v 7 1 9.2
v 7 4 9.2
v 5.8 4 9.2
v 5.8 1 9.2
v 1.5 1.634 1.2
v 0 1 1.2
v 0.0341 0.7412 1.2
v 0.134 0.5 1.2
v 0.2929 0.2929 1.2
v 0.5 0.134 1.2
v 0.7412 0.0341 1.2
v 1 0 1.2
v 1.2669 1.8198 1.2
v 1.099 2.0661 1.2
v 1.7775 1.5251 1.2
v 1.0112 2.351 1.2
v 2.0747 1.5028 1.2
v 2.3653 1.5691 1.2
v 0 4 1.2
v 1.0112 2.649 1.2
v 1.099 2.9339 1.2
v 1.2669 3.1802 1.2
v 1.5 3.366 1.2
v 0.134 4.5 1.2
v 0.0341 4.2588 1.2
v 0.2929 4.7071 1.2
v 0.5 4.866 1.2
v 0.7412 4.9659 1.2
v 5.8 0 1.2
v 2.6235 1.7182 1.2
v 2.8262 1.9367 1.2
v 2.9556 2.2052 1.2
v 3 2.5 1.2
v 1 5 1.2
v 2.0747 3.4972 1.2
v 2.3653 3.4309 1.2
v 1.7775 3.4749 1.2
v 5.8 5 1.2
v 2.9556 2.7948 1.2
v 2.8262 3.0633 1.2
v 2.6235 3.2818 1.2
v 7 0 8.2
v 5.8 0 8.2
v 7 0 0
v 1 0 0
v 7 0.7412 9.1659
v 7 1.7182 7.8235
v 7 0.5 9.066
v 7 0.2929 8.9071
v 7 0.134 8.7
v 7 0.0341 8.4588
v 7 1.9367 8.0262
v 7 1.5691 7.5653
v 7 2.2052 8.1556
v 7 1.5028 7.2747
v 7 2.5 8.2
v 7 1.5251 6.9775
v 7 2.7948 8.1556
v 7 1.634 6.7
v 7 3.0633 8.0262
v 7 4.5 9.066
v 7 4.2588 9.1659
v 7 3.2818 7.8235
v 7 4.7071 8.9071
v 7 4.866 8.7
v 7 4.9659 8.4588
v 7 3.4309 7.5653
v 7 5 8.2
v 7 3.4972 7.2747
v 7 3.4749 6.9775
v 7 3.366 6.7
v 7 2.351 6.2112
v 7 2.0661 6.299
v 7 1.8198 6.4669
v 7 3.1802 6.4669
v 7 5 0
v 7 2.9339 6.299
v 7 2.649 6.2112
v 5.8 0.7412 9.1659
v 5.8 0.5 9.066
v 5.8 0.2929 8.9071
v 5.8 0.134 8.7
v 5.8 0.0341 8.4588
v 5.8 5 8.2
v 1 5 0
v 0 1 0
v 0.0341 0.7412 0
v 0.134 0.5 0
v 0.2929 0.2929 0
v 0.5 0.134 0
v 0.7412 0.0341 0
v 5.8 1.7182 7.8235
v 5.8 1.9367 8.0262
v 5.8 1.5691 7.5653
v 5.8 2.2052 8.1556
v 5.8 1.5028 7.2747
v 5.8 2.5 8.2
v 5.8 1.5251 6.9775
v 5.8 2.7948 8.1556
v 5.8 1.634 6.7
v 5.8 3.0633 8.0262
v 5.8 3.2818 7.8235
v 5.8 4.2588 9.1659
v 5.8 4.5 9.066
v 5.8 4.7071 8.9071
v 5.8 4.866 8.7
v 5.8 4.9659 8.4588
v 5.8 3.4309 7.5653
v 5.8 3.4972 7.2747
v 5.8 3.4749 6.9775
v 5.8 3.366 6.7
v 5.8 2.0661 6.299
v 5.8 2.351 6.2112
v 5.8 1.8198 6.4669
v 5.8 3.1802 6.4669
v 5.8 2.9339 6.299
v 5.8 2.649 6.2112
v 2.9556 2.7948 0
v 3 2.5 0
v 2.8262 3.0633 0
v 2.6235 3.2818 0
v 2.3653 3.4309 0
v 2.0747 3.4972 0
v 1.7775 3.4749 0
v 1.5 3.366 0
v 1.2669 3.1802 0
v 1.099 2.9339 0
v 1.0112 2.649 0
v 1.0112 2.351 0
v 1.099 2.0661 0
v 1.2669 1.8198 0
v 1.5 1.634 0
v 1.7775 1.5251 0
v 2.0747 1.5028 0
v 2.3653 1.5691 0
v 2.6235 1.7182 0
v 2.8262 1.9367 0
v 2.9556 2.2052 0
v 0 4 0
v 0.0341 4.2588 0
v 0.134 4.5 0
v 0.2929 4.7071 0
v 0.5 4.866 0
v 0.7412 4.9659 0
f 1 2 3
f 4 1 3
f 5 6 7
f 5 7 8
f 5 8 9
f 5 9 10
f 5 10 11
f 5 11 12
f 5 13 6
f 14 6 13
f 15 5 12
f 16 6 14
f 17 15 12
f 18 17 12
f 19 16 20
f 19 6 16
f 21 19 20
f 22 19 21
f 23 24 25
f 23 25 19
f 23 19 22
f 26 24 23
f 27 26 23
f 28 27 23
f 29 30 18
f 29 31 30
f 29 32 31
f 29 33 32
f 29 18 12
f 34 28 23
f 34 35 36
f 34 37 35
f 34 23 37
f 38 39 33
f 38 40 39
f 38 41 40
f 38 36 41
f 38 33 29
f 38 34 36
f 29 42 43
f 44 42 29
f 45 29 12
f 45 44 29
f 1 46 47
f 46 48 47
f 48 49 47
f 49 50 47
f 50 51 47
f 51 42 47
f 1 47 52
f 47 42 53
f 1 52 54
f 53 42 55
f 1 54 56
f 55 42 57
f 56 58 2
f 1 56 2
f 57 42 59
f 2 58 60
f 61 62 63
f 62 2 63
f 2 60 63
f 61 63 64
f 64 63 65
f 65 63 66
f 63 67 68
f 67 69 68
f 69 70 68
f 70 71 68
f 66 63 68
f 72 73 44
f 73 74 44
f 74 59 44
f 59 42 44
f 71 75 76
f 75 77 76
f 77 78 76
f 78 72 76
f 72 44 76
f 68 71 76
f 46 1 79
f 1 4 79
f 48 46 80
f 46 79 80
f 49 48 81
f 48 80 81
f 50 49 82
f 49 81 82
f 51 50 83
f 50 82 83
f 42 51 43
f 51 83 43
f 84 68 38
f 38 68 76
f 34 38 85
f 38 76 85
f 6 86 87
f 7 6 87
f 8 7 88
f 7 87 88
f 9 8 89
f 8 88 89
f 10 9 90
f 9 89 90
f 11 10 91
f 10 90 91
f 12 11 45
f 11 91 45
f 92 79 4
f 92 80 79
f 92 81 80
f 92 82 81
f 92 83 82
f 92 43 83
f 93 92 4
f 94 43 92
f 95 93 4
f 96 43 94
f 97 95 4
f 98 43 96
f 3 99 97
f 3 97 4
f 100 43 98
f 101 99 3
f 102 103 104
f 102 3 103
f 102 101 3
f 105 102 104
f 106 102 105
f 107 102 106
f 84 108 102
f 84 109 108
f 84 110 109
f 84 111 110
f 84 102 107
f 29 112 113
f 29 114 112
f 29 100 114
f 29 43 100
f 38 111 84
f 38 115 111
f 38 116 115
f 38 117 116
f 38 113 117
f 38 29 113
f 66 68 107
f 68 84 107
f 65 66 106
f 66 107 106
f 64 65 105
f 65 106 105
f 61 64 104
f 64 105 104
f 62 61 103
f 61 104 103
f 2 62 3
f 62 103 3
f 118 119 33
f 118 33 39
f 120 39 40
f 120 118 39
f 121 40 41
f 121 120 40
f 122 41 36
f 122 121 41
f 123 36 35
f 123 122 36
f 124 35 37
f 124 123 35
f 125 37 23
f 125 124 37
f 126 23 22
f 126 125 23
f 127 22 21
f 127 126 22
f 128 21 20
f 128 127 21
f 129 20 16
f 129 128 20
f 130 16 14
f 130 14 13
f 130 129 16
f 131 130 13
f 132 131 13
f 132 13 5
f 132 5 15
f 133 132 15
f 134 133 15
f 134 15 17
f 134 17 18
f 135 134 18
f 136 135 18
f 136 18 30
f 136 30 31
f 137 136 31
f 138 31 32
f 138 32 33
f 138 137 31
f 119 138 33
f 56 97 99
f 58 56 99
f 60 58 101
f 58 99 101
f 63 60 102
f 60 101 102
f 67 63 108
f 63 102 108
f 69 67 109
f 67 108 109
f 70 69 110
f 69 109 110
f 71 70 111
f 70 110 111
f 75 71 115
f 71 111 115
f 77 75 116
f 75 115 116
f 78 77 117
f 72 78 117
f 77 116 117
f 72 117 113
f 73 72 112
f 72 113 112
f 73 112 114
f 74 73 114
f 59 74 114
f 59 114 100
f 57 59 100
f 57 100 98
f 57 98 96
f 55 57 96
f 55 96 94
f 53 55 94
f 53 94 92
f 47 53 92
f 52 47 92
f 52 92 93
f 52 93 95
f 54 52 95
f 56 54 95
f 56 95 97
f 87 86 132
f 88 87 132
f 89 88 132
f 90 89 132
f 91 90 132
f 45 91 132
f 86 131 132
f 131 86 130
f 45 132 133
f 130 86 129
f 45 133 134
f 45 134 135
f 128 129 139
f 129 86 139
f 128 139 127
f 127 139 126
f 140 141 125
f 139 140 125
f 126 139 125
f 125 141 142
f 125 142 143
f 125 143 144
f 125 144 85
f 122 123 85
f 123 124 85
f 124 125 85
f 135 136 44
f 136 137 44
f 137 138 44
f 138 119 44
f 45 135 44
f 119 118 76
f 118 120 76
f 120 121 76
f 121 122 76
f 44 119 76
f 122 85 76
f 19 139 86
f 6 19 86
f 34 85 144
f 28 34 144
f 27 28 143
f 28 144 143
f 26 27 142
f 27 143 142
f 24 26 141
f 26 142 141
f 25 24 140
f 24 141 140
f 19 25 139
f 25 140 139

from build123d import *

# Parameters (mm, degrees)
SKETCH_1_R          = 1
EXTRUDE_1_DEPTH     = 1.2
SKETCH_2_W          = 1.2
SKETCH_2_H          = 5
EXTRUDE_2_DEPTH     = 8
FILLET_1_R          = 1
SKETCH_4_R          = 1
CUT_EXTRUDE_1_DEPTH = 2


with BuildPart() as part:
    # 草图1 → 凸台-拉伸1 (new body)
    with BuildSketch(Plane.XY):
        with BuildLine():
            Line((1, 0), (7, 0))
            Line((7, 0), (7, 5))
            Line((7, 5), (1, 5))
            ThreePointArc((1, 5), (0.292893219, 4.707106781), (0, 4))
            Line((0, 4), (0, 1))
            ThreePointArc((0, 1), (0.292893219, 0.292893219), (1, 0))
        make_face()
        with Locations((2, 2.5)):
            Circle(SKETCH_1_R, mode=Mode.SUBTRACT)
    extrude(amount=EXTRUDE_1_DEPTH)

    # 草图2 → 凸台-拉伸2 (add)
    with BuildSketch(Plane(origin=(0, 0, 1.2), x_dir=(-1, 0, 0), z_dir=(0, 0, -1))):
        with Locations((-6.4, 2.5)):
            Rectangle(SKETCH_2_W, SKETCH_2_H)
    extrude(amount=-EXTRUDE_2_DEPTH)

    # 圆角1
    fillet_1_edges = [part.edges().sort_by_distance(p)[0] for p in [
        (6.4, 0, 9.2),
        (6.4, 5, 9.2),
    ]]
    fillet(fillet_1_edges, radius=FILLET_1_R)

    # 草图4 → 切除-拉伸1 (cut)
    with BuildSketch(Plane.ZY.offset(-5.8)):
        with Locations((7.2, 2.5)):
            Circle(SKETCH_4_R)
    extrude(amount=-CUT_EXTRUDE_1_DEPTH, mode=Mode.SUBTRACT)


solid = part.part
